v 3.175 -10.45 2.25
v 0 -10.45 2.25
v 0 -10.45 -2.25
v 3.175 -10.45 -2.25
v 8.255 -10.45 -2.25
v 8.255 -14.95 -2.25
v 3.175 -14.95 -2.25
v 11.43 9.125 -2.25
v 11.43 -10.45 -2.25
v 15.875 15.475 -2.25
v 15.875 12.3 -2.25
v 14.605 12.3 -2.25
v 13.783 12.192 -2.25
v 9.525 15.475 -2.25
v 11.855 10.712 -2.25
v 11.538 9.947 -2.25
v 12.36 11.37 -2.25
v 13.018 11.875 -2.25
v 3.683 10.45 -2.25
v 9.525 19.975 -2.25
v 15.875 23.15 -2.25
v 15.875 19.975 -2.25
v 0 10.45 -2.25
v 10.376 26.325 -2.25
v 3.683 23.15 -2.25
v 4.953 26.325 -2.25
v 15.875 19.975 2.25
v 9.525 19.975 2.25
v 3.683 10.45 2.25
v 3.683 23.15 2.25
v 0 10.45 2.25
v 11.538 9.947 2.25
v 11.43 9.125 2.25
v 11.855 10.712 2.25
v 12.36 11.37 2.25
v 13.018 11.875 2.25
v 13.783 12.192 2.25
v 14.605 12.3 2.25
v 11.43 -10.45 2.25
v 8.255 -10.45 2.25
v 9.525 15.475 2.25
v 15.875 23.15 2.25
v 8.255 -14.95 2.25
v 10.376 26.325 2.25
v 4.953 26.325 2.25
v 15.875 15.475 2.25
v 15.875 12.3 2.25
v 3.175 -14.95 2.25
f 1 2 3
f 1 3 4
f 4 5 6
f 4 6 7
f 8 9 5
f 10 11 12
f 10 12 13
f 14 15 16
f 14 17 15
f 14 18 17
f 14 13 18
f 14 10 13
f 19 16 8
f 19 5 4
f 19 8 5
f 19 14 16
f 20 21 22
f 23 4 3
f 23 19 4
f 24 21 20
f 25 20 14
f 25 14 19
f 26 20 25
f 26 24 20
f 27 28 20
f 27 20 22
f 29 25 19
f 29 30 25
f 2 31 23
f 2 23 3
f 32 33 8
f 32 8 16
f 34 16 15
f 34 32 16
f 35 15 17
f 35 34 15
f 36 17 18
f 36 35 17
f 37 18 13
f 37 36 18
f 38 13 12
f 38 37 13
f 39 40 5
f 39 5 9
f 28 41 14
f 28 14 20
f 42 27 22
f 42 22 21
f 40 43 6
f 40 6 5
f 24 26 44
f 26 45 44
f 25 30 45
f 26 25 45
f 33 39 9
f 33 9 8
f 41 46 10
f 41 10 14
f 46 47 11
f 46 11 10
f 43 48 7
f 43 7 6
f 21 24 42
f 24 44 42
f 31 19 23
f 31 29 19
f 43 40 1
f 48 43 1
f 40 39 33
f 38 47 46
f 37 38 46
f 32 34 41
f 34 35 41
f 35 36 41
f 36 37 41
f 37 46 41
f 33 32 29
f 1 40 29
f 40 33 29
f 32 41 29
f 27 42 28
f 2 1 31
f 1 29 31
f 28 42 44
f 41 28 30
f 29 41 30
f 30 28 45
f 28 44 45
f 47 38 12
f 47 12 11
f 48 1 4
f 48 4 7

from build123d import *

# Parameters (mm, degrees)
BOSS_EXTRUDE1_DEPTH = 2.25
BOSS_EXTRUDE2_DEPTH = 2.249999945
SKETCH4_W           = 3.683
SKETCH4_H           = 4.5
BOSS_EXTRUDE3_DEPTH = 1.143


with BuildPart() as part:
    # Sketch1 → Boss-Extrude1 (new body, symmetric)
    with BuildSketch(Plane.XY):
        with BuildLine():
            Line((0, 10.45), (0, -10.45))
            Line((0, -10.45), (3.175, -10.45))
            Line((3.175, -10.45), (3.175, -14.95))
            Line((3.175, -14.95), (8.255, -14.95))
            Line((8.255, -14.95), (8.255, -10.45))
            Line((8.255, -10.45), (11.43, -10.45))
            Line((11.43, -10.45), (11.43, 9.125))
            ThreePointArc((11.43, 9.125), (12.35993597, 11.37006403), (14.605, 12.3))
            Line((14.605, 12.3), (15.875, 12.3))
            Line((15.875, 12.3), (15.875, 15.475))
            Line((15.875, 15.475), (9.525, 15.475))
            Line((9.525, 15.475), (9.525, 19.975))
            Line((9.525, 19.975), (15.875, 19.975))
            Line((15.875, 19.975), (15.875, 23.15))
            Line((15.875, 23.15), (3.683, 23.15))
            Line((3.683, 23.15), (3.683, 10.45))
            Line((3.683, 10.45), (0, 10.45))
        make_face()
    extrude(amount=BOSS_EXTRUDE1_DEPTH, both=True)

    # Sketch2 → Boss-Extrude2 (add, symmetric)
    with BuildSketch(Plane.XY):
        Polygon((3.683, 23.15), (4.953, 26.325), (10.375738686, 26.325), (15.875, 23.15), align=None)
    extrude(amount=BOSS_EXTRUDE2_DEPTH, both=True)

    # Sketch4 → Boss-Extrude3 (add)
    with BuildSketch(Plane(origin=(0, 8.545, 0), x_dir=(1, 0, 0), z_dir=(0, 1, 0))):
        with Locations((1.8415, 0)):
            Rectangle(SKETCH4_W, SKETCH4_H)
    extrude(amount=BOSS_EXTRUDE3_DEPTH)


solid = part.part
